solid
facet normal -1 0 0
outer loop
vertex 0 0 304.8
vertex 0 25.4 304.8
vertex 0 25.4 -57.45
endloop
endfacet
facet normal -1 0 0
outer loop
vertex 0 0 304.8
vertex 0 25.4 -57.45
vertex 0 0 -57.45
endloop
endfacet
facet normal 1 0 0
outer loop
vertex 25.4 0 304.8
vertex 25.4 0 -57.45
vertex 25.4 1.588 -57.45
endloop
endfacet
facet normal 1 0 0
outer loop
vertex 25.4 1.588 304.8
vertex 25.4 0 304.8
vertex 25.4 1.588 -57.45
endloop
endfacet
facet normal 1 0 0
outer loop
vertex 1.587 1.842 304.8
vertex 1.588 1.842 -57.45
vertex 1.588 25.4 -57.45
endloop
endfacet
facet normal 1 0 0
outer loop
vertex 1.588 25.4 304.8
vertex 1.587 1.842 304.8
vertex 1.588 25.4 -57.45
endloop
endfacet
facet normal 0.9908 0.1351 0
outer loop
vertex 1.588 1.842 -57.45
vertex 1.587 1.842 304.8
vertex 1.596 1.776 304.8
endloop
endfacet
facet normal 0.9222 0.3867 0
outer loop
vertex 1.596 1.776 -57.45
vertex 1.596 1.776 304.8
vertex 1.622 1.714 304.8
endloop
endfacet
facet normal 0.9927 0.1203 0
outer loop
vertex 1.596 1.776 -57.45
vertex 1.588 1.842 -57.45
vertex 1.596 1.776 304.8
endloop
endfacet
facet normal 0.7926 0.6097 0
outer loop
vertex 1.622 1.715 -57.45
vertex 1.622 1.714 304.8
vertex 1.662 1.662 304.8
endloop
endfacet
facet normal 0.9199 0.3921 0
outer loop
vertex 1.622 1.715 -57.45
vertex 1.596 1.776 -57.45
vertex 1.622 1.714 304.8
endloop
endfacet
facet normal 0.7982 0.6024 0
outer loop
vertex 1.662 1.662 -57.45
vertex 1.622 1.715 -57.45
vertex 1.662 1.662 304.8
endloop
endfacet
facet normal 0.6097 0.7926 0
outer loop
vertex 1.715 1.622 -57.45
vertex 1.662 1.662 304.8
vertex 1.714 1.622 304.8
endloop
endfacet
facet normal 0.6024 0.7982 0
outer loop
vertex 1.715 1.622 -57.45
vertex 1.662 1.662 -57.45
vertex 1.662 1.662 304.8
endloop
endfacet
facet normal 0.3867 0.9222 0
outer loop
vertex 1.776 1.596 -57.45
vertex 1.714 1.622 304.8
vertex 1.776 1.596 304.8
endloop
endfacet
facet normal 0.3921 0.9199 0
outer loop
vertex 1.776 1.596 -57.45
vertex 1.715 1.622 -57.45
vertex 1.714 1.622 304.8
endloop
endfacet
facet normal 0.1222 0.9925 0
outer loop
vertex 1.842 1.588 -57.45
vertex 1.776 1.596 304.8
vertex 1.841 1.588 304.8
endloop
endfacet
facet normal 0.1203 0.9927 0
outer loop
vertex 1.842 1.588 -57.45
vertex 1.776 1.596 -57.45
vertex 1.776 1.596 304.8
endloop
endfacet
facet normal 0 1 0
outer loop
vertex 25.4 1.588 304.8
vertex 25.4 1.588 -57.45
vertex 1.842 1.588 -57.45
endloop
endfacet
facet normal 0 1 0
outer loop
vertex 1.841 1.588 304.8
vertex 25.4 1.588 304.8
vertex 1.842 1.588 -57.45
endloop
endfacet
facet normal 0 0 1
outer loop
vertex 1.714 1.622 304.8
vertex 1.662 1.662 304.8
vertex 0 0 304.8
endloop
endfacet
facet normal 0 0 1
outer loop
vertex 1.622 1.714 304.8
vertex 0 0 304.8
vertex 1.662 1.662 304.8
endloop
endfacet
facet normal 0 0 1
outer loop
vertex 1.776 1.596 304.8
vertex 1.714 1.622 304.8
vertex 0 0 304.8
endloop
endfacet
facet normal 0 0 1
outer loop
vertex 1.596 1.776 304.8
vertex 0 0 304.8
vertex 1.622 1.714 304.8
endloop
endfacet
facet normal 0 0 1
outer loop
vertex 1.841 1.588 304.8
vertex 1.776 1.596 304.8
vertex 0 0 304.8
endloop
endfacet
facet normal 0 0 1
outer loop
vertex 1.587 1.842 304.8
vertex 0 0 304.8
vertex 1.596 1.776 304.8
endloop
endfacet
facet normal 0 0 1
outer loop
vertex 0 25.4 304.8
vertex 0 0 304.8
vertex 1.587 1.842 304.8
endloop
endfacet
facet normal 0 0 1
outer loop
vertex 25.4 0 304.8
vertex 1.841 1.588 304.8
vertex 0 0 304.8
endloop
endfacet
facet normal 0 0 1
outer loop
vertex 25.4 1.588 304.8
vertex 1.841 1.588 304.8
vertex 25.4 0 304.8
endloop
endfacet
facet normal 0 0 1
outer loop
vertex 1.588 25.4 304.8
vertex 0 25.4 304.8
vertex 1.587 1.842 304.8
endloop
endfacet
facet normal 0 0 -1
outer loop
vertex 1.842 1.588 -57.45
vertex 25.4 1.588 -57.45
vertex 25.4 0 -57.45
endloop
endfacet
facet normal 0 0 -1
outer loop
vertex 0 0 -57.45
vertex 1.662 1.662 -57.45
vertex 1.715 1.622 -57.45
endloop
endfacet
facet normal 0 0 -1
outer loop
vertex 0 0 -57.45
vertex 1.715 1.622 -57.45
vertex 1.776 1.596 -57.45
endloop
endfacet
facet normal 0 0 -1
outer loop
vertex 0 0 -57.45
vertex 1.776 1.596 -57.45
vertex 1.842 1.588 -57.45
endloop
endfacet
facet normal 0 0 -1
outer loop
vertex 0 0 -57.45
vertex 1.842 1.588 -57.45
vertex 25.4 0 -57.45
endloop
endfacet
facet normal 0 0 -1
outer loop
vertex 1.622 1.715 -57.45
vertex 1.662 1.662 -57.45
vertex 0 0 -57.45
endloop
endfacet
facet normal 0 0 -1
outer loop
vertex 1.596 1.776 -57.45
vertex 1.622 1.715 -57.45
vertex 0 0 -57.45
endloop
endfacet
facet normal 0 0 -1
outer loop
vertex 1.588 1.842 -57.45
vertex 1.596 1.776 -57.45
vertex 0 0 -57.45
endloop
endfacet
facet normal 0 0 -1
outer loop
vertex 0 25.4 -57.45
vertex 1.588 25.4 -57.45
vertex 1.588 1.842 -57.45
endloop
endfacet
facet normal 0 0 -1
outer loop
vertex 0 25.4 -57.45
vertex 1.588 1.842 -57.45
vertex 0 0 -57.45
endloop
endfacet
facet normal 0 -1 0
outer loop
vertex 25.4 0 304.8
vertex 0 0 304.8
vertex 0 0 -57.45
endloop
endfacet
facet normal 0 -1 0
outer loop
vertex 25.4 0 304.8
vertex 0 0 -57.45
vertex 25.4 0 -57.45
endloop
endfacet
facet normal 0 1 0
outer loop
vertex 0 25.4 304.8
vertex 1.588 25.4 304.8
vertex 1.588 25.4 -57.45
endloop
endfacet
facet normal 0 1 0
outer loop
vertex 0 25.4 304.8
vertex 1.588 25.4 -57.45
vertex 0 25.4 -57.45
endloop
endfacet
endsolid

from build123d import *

# Parameters (mm, degrees)
BOSS_EXTRUDE1_DEPTH = 304.8
FILLET1_R           = 0.254
CUT_EXTRUDE1_DEPTH  = 247.35


with BuildPart() as part:
    # Sketch3 → Boss-Extrude1 (new, symmetric)
    with BuildSketch(Plane.XY):
        Polygon((1.5875, 25.4), (0, 25.4), (0, 0), (25.4, 0), (25.4, 1.5875), (1.5875, 1.5875), align=None)
    extrude(amount=BOSS_EXTRUDE1_DEPTH, both=True)

    # Fillet1
    fillet1_edges = [part.edges().sort_by_distance(p)[0] for p in [
        (1.5875, 1.5875, 0),
    ]]
    fillet(fillet1_edges, radius=FILLET1_R)

    # Sketch4 → Cut-Extrude1 (cut)
    with BuildSketch(Plane(origin=(0, 0, -304.8), x_dir=(-1, 0, 0), z_dir=(0, 0, -1))):
        with BuildLine():
            Line((-1.5875, 25.4), (-1.5875, 1.8415))
            ThreePointArc((-1.5875, 1.8415), (-1.661894878, 1.661894878), (-1.8415, 1.5875))
            Line((-1.8415, 1.5875), (-25.4, 1.5875))
            Line((-25.4, 1.5875), (-25.4, 0))
            Line((-25.4, 0), (0, 0))
            Line((0, 0), (0, 25.4))
            Line((0, 25.4), (-1.5875, 25.4))
        make_face()
    extrude(amount=-CUT_EXTRUDE1_DEPTH, mode=Mode.SUBTRACT)


solid = part.part
